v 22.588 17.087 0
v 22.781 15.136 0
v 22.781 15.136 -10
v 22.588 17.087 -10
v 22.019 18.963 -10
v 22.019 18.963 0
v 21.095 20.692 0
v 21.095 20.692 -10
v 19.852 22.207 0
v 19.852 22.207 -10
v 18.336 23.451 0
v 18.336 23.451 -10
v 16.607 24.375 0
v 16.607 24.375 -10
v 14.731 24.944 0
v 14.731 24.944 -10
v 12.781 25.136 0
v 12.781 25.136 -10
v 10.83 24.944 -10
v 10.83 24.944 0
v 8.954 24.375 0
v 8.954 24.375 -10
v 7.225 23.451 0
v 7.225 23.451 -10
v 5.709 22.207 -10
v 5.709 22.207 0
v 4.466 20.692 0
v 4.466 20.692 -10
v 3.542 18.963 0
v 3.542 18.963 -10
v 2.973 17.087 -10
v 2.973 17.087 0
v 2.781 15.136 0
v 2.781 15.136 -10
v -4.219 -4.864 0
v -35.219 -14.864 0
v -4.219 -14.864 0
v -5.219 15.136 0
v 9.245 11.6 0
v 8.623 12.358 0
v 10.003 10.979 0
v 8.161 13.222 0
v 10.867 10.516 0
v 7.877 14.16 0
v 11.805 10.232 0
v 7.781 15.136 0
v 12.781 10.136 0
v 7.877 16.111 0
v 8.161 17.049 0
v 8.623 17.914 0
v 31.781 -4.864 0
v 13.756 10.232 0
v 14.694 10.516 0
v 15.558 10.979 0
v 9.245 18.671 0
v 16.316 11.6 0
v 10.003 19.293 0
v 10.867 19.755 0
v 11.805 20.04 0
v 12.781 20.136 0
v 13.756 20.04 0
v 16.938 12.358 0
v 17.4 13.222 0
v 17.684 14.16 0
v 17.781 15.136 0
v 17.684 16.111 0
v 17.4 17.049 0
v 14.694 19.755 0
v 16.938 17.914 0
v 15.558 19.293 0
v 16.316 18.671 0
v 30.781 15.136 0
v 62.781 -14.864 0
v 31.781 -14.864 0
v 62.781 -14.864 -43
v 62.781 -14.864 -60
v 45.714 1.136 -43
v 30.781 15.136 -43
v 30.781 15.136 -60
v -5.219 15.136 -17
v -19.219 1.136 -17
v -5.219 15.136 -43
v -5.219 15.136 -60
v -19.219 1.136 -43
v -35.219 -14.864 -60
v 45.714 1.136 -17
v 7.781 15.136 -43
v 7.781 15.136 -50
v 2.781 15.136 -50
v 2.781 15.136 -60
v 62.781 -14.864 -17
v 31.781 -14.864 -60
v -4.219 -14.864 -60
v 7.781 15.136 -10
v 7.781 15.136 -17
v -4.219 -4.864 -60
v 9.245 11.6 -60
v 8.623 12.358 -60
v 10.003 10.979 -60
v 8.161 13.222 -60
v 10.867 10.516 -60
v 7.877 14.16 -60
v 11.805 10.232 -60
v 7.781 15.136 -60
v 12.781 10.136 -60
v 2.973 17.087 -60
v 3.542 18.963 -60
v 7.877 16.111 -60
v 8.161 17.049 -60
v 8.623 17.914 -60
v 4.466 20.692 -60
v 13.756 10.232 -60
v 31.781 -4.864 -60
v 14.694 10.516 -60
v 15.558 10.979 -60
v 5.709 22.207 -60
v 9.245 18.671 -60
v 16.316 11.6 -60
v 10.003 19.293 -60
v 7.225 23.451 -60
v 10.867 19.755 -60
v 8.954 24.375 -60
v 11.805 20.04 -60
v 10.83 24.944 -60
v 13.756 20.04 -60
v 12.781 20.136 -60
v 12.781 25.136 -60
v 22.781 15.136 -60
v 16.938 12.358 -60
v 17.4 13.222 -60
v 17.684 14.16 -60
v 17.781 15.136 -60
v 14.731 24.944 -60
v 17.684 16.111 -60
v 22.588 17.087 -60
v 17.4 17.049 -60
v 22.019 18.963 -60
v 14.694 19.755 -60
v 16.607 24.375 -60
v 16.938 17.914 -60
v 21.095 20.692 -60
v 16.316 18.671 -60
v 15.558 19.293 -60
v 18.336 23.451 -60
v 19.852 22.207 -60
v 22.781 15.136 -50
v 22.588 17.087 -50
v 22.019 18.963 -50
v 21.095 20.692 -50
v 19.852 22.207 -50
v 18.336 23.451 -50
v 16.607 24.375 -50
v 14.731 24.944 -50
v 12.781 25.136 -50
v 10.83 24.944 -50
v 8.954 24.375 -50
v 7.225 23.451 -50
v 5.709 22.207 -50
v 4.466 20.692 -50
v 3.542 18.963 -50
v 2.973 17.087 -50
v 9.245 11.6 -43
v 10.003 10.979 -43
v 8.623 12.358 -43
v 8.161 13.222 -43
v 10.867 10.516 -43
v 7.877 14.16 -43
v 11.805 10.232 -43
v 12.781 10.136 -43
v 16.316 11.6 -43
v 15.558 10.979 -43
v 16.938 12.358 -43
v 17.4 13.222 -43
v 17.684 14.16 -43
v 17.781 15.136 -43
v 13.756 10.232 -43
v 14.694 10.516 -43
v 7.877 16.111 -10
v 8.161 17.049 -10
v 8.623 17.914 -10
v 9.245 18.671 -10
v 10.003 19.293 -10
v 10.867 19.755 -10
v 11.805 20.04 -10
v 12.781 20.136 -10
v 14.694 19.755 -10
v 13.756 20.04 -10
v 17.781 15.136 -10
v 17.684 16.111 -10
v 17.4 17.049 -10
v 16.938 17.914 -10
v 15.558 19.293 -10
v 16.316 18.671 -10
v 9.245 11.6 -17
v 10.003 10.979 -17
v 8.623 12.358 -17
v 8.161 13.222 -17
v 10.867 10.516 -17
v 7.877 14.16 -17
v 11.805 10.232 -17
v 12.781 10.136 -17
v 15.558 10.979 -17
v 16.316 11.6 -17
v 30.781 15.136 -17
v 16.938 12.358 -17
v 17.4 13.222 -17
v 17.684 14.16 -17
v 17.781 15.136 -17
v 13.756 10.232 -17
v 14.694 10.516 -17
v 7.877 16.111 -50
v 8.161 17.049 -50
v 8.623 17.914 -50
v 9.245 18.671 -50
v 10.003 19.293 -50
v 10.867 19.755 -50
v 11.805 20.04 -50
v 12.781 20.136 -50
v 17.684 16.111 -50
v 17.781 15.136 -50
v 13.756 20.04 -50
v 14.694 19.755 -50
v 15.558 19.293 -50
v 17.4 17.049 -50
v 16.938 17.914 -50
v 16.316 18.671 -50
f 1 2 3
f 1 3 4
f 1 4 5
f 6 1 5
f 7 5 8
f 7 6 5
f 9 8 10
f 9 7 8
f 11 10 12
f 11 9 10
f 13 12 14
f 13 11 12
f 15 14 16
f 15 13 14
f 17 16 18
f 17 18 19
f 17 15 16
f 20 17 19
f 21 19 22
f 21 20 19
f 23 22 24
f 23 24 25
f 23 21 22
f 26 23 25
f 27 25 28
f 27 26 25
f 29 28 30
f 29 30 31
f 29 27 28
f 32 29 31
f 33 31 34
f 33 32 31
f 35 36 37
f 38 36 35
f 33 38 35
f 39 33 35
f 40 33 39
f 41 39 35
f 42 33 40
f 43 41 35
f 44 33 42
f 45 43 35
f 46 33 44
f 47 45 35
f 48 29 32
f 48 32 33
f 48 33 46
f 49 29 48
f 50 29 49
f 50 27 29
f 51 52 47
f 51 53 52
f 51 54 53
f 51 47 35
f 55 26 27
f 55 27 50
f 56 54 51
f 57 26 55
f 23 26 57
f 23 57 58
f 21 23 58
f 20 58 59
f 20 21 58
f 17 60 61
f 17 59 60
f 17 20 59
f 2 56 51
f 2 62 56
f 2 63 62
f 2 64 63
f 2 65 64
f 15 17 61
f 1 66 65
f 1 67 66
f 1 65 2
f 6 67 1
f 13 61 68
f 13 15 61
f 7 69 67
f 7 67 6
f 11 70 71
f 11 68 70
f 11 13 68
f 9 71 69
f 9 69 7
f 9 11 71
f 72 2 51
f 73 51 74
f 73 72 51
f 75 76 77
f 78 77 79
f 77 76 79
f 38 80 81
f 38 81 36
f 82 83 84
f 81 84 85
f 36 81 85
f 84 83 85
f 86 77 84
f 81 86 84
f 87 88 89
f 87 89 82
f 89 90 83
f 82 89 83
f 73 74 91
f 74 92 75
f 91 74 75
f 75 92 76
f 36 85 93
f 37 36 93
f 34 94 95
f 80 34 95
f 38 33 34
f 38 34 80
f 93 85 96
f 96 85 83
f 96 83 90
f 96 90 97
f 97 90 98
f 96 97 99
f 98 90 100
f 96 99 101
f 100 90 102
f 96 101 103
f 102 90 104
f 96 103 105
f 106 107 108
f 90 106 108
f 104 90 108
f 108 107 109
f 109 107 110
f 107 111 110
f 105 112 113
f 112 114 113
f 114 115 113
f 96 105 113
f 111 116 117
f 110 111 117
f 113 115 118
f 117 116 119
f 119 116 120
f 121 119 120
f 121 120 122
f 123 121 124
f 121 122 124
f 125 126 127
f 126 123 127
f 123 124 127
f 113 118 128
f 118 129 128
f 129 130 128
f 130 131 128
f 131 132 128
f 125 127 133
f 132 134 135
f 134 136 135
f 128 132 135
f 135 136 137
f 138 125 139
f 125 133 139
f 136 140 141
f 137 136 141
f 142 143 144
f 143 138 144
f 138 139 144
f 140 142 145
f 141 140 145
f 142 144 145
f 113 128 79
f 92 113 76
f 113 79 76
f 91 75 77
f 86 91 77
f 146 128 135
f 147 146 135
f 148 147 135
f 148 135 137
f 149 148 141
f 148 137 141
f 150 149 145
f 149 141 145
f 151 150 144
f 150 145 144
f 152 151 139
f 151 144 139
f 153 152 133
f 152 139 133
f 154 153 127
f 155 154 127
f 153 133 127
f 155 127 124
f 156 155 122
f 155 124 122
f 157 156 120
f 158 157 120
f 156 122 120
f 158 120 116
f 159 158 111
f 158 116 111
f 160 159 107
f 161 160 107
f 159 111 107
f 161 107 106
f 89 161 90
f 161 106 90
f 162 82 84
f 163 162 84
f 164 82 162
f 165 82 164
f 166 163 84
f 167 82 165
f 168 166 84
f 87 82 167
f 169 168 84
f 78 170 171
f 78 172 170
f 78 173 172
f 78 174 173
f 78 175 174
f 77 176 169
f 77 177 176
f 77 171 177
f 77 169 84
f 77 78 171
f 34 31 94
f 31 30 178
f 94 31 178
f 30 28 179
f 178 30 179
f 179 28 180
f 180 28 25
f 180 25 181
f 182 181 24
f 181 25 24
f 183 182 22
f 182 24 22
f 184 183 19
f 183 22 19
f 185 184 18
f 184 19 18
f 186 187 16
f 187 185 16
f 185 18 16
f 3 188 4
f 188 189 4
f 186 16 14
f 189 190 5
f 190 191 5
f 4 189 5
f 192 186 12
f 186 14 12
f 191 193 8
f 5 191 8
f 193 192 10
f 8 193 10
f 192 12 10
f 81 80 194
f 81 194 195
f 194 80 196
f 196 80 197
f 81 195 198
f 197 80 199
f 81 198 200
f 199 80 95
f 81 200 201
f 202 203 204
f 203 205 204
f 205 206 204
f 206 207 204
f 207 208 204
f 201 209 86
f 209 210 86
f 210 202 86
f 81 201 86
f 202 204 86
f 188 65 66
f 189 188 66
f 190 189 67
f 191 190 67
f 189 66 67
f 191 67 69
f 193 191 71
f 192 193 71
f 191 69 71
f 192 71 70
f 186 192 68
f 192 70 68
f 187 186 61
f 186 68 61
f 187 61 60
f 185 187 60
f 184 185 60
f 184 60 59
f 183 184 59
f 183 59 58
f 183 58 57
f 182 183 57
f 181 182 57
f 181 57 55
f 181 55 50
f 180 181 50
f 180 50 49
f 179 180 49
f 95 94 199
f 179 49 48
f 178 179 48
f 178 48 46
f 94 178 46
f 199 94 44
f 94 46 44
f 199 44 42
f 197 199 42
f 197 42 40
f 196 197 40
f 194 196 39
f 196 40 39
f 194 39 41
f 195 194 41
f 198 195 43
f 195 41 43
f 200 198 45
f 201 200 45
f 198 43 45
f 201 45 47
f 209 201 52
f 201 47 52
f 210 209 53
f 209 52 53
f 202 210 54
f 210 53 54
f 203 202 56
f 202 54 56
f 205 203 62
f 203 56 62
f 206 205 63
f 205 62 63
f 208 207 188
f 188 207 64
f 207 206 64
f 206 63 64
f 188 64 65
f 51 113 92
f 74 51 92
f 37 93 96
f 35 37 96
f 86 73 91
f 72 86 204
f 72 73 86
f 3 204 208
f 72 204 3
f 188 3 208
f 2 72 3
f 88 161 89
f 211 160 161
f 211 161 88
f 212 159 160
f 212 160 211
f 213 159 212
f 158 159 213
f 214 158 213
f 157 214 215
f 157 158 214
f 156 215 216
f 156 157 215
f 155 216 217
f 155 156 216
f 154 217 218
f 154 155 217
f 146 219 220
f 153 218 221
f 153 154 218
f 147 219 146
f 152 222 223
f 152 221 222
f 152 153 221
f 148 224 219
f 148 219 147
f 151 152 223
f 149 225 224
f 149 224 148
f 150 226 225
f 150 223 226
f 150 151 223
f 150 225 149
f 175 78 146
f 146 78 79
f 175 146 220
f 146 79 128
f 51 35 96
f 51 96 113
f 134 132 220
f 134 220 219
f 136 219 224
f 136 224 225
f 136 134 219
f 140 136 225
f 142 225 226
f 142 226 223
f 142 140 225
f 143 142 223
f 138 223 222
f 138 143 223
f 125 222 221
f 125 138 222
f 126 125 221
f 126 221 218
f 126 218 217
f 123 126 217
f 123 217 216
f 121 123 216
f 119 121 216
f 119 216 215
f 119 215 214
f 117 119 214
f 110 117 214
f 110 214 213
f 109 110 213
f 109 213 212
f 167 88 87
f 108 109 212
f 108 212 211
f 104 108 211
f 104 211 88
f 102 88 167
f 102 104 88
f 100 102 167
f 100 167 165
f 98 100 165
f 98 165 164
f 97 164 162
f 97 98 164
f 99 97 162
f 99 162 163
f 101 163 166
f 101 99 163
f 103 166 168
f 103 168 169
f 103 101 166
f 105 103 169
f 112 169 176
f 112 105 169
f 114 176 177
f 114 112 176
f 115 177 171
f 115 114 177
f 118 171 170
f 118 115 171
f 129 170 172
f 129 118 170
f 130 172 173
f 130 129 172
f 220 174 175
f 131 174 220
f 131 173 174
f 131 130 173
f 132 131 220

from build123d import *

# Parameters (mm, degrees)
BOSS_EXTRUDE1_DEPTH = 17
BOSS_EXTRUDE2_DEPTH = 10
SKETCH3_R           = 5
CUT_EXTRUDE1_DEPTH  = 17
BOSS_EXTRUDE3_DEPTH = 13


with BuildPart() as part:
    # Sketch1 → Boss-Extrude1 (new body)
    with BuildSketch(Plane.XY):
        Polygon((-35.219488433, -14.864106981), (-4.219488433, -14.864106981), (-4.219488433, -4.864106981), (31.780511567, -4.864106981), (31.780511567, -14.864106981), (62.780511567, -14.864106981), (30.780511567, 15.135893019), (20.780511567, 15.135893019), (4.780511567, 15.135893019), (-5.219488433, 15.135893019), align=None)
    extrude(amount=-BOSS_EXTRUDE1_DEPTH)

    # Sketch2 → Boss-Extrude2 (add)
    with BuildSketch(Plane.XY):
        with BuildLine():
            ThreePointArc((22.780511567, 15.135893019), (12.780511567, 25.135893019), (2.780511567, 15.135893019))
            Line((2.780511567, 15.135893019), (22.780511567, 15.135893019))
        make_face()
        with BuildLine():
            Line((22.780511567, 15.135893019), (2.780511567, 15.135893019))
            ThreePointArc((2.780511567, 15.135893019), (12.780511567, 5.135893019), (22.780511567, 15.135893019))
        make_face()
    extrude(amount=-BOSS_EXTRUDE2_DEPTH)

    # Sketch3 → Cut-Extrude1 (cut)
    with BuildSketch(Plane.XY):
        with Locations((12.780511567, 15.135893019)):
            Circle(SKETCH3_R)
    extrude(amount=-CUT_EXTRUDE1_DEPTH, mode=Mode.SUBTRACT)

    # Sketch4 → Boss-Extrude3 (add)
    with BuildSketch(Plane(origin=(0, 0, -17), x_dir=(-1, 0, 0), z_dir=(0, 0, -1))):
        Polygon((-62.780511567, -14.864106981), (-45.7138449, 1.135893019), (19.219488433, 1.135893019), (35.219488433, -14.864106981), (4.219488433, -14.864106981), (4.219488433, -4.864106981), (-31.780511567, -4.864106981), (-31.780511567, -14.864106981), align=None)
    extrude(amount=BOSS_EXTRUDE3_DEPTH)

    # Mirror9: part across plane


with BuildPart() as part_1:
    add(part.part)
    add(part.part.mirror(Plane(origin=(0, 0, -30), x_dir=(1, 0, 0), z_dir=(0, 0, -1))))


solid = part_1.part
